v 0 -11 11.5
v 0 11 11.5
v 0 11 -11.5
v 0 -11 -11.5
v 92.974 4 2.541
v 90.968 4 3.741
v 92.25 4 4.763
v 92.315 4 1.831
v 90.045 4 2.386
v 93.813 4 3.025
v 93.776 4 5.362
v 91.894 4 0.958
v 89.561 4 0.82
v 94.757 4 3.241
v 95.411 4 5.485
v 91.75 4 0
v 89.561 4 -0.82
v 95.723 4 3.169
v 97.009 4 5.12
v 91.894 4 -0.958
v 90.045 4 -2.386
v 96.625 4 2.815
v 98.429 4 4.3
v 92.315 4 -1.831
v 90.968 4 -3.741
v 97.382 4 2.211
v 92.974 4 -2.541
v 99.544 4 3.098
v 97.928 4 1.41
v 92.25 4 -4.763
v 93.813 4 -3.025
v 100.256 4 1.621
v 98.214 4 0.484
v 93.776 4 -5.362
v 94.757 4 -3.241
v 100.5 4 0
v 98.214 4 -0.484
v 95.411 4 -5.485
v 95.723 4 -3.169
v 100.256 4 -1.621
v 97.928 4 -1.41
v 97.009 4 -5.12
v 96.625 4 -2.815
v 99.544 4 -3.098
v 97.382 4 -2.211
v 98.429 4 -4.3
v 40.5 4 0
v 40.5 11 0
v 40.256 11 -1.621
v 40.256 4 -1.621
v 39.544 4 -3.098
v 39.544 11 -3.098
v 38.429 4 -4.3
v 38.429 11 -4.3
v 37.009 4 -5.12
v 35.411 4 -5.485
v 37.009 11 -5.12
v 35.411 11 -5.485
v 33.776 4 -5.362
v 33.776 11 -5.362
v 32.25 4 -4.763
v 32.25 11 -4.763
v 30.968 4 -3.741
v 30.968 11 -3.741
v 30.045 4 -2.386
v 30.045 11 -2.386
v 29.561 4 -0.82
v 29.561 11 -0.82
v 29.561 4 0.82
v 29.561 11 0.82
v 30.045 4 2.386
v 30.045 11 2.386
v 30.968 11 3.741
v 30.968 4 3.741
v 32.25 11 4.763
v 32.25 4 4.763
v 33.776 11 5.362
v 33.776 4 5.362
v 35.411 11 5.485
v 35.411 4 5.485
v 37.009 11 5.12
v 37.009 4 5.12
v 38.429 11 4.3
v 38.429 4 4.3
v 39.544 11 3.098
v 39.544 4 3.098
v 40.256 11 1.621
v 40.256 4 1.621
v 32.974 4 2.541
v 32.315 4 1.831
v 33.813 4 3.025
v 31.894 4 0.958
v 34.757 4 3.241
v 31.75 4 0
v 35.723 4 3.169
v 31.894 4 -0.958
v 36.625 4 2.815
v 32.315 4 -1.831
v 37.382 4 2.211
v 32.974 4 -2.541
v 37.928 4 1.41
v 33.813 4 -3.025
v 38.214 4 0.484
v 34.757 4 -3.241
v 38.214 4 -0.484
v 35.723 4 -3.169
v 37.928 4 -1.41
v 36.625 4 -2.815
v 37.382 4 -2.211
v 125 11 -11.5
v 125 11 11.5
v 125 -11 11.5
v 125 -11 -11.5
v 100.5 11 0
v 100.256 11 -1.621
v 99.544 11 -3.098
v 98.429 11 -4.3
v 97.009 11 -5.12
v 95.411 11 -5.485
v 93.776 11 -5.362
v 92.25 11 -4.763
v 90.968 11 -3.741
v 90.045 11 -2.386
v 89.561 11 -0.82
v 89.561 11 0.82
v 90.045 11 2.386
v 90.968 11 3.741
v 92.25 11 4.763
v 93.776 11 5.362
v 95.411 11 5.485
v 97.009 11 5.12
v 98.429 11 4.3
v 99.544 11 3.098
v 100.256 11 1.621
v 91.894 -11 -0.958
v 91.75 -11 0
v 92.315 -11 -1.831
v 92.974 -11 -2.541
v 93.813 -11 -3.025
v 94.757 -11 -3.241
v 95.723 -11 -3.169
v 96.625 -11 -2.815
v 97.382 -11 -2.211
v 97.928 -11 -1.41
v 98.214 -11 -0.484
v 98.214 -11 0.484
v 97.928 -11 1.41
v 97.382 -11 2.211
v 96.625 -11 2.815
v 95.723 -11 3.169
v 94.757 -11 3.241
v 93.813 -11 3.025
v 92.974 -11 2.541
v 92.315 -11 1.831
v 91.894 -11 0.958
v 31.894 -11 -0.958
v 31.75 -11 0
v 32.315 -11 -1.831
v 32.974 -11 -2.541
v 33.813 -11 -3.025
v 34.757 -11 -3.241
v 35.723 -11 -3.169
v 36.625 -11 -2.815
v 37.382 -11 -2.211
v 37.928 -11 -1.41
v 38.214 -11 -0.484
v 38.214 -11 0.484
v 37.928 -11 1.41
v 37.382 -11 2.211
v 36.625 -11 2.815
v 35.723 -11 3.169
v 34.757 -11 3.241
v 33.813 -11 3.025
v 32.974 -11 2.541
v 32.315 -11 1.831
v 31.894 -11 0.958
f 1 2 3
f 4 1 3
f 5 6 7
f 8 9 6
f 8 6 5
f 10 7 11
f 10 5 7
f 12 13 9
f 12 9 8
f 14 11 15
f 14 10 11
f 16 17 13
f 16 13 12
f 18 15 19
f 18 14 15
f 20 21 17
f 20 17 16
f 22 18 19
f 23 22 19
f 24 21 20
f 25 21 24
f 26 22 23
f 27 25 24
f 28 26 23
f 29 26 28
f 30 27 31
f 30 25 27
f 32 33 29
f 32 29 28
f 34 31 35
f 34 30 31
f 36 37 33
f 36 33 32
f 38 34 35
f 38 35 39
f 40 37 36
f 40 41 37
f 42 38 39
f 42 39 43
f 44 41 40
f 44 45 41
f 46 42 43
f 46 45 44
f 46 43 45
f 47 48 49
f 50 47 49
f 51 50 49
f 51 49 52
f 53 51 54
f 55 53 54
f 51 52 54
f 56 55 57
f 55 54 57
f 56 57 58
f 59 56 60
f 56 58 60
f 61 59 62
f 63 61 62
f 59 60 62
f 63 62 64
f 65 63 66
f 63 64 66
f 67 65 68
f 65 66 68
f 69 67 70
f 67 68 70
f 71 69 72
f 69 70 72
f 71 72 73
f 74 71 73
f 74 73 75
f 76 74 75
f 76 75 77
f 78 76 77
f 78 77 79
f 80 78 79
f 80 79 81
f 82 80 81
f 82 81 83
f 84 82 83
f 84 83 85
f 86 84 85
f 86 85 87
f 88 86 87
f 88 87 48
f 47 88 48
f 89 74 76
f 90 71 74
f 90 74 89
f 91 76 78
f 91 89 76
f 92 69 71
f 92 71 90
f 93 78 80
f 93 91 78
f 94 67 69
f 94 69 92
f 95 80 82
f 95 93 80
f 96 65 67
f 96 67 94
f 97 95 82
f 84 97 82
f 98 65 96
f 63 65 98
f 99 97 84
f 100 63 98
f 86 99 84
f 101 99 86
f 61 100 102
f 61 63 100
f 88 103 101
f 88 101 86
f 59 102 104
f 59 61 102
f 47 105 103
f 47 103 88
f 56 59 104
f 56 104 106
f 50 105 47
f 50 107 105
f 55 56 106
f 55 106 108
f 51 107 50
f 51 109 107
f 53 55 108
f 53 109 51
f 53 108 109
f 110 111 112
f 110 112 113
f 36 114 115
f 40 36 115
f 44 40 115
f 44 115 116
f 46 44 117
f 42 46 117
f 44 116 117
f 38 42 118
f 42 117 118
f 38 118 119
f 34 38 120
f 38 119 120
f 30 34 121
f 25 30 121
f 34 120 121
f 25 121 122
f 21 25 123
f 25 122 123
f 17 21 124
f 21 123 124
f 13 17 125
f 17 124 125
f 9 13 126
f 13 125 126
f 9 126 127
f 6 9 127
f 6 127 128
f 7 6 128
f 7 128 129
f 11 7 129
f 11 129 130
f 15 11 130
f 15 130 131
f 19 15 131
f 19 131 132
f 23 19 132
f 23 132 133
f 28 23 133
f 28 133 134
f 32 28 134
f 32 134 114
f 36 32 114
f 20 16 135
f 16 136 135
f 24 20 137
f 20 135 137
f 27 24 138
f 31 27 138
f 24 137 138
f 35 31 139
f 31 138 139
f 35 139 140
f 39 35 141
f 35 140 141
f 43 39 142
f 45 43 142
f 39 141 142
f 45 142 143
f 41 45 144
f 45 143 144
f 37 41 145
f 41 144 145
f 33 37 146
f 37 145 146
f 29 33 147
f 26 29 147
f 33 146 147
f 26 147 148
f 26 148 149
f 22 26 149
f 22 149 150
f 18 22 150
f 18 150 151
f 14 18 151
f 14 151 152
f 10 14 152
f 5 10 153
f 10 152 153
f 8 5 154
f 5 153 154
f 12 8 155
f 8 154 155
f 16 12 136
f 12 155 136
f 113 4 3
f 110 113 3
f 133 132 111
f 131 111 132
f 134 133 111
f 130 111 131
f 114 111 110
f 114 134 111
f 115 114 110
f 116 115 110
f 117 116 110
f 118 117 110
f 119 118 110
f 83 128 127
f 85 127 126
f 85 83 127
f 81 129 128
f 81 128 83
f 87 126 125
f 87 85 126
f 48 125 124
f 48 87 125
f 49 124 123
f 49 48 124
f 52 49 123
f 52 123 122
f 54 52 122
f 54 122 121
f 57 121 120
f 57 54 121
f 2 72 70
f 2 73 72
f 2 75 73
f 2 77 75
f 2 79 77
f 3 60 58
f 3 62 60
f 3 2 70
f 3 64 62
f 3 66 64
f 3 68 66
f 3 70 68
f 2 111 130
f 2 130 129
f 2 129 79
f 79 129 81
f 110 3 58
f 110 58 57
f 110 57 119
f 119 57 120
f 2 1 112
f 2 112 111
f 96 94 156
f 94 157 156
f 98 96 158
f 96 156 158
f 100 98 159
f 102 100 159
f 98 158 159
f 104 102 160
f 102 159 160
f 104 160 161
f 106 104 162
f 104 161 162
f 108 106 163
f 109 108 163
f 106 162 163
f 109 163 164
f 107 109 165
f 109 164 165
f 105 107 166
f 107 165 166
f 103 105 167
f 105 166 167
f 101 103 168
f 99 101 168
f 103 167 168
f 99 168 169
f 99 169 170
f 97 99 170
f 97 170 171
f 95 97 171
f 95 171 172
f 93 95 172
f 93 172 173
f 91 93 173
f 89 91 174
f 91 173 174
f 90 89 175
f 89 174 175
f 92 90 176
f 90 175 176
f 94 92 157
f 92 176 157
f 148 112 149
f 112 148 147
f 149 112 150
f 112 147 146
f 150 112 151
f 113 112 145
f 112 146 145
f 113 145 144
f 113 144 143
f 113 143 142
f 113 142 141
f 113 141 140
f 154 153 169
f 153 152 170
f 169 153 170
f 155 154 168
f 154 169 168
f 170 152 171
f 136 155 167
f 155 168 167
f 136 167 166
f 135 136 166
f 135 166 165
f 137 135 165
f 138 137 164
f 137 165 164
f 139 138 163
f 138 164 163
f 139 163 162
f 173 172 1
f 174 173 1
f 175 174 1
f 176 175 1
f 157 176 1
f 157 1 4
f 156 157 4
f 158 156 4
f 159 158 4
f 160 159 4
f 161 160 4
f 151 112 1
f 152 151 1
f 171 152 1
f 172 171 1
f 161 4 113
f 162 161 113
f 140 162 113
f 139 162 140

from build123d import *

# Parameters (mm, degrees)
SKETCH_1_W                = 23
SKETCH_1_H                = 22
EXTRUDE_1_DEPTH           = 125
HOLE_WIZARD_1_D           = 6.5
HOLE_WIZARD_1_CBORE_D     = 11
HOLE_WIZARD_1_CBORE_DEPTH = 7
PATTERN_LINEAR_2_COUNT    = 2
PATTERN_LINEAR_2_PITCH    = 60


with BuildPart() as part:
    # 草图1 → 凸台-拉伸1 (new body)
    with BuildSketch(Plane(origin=(0, 0, 0), x_dir=(0, 0, -1), z_dir=(1, 0, 0))):
        Rectangle(SKETCH_1_W, SKETCH_1_H)
    extrude(amount=EXTRUDE_1_DEPTH)

    # 打孔尺寸(%根据)内六角圆柱头螺钉的类型1 (through all)
    with Locations(Plane(origin=(0, 11, 0), x_dir=(1, 0, 0), z_dir=(0, 1, 0))):
        with Locations((35, 0)):
            hole_wizard_1 = CounterBoreHole(HOLE_WIZARD_1_D / 2, HOLE_WIZARD_1_CBORE_D / 2, HOLE_WIZARD_1_CBORE_DEPTH)

    # 阵列(线性)2: 打孔尺寸(%根据)内六角圆柱头螺钉的类型1 ×2
    with Locations(*[(i * PATTERN_LINEAR_2_PITCH, 0, 0) for i in range(1, PATTERN_LINEAR_2_COUNT)]):
        add(hole_wizard_1, mode=Mode.SUBTRACT)


solid = part.part
